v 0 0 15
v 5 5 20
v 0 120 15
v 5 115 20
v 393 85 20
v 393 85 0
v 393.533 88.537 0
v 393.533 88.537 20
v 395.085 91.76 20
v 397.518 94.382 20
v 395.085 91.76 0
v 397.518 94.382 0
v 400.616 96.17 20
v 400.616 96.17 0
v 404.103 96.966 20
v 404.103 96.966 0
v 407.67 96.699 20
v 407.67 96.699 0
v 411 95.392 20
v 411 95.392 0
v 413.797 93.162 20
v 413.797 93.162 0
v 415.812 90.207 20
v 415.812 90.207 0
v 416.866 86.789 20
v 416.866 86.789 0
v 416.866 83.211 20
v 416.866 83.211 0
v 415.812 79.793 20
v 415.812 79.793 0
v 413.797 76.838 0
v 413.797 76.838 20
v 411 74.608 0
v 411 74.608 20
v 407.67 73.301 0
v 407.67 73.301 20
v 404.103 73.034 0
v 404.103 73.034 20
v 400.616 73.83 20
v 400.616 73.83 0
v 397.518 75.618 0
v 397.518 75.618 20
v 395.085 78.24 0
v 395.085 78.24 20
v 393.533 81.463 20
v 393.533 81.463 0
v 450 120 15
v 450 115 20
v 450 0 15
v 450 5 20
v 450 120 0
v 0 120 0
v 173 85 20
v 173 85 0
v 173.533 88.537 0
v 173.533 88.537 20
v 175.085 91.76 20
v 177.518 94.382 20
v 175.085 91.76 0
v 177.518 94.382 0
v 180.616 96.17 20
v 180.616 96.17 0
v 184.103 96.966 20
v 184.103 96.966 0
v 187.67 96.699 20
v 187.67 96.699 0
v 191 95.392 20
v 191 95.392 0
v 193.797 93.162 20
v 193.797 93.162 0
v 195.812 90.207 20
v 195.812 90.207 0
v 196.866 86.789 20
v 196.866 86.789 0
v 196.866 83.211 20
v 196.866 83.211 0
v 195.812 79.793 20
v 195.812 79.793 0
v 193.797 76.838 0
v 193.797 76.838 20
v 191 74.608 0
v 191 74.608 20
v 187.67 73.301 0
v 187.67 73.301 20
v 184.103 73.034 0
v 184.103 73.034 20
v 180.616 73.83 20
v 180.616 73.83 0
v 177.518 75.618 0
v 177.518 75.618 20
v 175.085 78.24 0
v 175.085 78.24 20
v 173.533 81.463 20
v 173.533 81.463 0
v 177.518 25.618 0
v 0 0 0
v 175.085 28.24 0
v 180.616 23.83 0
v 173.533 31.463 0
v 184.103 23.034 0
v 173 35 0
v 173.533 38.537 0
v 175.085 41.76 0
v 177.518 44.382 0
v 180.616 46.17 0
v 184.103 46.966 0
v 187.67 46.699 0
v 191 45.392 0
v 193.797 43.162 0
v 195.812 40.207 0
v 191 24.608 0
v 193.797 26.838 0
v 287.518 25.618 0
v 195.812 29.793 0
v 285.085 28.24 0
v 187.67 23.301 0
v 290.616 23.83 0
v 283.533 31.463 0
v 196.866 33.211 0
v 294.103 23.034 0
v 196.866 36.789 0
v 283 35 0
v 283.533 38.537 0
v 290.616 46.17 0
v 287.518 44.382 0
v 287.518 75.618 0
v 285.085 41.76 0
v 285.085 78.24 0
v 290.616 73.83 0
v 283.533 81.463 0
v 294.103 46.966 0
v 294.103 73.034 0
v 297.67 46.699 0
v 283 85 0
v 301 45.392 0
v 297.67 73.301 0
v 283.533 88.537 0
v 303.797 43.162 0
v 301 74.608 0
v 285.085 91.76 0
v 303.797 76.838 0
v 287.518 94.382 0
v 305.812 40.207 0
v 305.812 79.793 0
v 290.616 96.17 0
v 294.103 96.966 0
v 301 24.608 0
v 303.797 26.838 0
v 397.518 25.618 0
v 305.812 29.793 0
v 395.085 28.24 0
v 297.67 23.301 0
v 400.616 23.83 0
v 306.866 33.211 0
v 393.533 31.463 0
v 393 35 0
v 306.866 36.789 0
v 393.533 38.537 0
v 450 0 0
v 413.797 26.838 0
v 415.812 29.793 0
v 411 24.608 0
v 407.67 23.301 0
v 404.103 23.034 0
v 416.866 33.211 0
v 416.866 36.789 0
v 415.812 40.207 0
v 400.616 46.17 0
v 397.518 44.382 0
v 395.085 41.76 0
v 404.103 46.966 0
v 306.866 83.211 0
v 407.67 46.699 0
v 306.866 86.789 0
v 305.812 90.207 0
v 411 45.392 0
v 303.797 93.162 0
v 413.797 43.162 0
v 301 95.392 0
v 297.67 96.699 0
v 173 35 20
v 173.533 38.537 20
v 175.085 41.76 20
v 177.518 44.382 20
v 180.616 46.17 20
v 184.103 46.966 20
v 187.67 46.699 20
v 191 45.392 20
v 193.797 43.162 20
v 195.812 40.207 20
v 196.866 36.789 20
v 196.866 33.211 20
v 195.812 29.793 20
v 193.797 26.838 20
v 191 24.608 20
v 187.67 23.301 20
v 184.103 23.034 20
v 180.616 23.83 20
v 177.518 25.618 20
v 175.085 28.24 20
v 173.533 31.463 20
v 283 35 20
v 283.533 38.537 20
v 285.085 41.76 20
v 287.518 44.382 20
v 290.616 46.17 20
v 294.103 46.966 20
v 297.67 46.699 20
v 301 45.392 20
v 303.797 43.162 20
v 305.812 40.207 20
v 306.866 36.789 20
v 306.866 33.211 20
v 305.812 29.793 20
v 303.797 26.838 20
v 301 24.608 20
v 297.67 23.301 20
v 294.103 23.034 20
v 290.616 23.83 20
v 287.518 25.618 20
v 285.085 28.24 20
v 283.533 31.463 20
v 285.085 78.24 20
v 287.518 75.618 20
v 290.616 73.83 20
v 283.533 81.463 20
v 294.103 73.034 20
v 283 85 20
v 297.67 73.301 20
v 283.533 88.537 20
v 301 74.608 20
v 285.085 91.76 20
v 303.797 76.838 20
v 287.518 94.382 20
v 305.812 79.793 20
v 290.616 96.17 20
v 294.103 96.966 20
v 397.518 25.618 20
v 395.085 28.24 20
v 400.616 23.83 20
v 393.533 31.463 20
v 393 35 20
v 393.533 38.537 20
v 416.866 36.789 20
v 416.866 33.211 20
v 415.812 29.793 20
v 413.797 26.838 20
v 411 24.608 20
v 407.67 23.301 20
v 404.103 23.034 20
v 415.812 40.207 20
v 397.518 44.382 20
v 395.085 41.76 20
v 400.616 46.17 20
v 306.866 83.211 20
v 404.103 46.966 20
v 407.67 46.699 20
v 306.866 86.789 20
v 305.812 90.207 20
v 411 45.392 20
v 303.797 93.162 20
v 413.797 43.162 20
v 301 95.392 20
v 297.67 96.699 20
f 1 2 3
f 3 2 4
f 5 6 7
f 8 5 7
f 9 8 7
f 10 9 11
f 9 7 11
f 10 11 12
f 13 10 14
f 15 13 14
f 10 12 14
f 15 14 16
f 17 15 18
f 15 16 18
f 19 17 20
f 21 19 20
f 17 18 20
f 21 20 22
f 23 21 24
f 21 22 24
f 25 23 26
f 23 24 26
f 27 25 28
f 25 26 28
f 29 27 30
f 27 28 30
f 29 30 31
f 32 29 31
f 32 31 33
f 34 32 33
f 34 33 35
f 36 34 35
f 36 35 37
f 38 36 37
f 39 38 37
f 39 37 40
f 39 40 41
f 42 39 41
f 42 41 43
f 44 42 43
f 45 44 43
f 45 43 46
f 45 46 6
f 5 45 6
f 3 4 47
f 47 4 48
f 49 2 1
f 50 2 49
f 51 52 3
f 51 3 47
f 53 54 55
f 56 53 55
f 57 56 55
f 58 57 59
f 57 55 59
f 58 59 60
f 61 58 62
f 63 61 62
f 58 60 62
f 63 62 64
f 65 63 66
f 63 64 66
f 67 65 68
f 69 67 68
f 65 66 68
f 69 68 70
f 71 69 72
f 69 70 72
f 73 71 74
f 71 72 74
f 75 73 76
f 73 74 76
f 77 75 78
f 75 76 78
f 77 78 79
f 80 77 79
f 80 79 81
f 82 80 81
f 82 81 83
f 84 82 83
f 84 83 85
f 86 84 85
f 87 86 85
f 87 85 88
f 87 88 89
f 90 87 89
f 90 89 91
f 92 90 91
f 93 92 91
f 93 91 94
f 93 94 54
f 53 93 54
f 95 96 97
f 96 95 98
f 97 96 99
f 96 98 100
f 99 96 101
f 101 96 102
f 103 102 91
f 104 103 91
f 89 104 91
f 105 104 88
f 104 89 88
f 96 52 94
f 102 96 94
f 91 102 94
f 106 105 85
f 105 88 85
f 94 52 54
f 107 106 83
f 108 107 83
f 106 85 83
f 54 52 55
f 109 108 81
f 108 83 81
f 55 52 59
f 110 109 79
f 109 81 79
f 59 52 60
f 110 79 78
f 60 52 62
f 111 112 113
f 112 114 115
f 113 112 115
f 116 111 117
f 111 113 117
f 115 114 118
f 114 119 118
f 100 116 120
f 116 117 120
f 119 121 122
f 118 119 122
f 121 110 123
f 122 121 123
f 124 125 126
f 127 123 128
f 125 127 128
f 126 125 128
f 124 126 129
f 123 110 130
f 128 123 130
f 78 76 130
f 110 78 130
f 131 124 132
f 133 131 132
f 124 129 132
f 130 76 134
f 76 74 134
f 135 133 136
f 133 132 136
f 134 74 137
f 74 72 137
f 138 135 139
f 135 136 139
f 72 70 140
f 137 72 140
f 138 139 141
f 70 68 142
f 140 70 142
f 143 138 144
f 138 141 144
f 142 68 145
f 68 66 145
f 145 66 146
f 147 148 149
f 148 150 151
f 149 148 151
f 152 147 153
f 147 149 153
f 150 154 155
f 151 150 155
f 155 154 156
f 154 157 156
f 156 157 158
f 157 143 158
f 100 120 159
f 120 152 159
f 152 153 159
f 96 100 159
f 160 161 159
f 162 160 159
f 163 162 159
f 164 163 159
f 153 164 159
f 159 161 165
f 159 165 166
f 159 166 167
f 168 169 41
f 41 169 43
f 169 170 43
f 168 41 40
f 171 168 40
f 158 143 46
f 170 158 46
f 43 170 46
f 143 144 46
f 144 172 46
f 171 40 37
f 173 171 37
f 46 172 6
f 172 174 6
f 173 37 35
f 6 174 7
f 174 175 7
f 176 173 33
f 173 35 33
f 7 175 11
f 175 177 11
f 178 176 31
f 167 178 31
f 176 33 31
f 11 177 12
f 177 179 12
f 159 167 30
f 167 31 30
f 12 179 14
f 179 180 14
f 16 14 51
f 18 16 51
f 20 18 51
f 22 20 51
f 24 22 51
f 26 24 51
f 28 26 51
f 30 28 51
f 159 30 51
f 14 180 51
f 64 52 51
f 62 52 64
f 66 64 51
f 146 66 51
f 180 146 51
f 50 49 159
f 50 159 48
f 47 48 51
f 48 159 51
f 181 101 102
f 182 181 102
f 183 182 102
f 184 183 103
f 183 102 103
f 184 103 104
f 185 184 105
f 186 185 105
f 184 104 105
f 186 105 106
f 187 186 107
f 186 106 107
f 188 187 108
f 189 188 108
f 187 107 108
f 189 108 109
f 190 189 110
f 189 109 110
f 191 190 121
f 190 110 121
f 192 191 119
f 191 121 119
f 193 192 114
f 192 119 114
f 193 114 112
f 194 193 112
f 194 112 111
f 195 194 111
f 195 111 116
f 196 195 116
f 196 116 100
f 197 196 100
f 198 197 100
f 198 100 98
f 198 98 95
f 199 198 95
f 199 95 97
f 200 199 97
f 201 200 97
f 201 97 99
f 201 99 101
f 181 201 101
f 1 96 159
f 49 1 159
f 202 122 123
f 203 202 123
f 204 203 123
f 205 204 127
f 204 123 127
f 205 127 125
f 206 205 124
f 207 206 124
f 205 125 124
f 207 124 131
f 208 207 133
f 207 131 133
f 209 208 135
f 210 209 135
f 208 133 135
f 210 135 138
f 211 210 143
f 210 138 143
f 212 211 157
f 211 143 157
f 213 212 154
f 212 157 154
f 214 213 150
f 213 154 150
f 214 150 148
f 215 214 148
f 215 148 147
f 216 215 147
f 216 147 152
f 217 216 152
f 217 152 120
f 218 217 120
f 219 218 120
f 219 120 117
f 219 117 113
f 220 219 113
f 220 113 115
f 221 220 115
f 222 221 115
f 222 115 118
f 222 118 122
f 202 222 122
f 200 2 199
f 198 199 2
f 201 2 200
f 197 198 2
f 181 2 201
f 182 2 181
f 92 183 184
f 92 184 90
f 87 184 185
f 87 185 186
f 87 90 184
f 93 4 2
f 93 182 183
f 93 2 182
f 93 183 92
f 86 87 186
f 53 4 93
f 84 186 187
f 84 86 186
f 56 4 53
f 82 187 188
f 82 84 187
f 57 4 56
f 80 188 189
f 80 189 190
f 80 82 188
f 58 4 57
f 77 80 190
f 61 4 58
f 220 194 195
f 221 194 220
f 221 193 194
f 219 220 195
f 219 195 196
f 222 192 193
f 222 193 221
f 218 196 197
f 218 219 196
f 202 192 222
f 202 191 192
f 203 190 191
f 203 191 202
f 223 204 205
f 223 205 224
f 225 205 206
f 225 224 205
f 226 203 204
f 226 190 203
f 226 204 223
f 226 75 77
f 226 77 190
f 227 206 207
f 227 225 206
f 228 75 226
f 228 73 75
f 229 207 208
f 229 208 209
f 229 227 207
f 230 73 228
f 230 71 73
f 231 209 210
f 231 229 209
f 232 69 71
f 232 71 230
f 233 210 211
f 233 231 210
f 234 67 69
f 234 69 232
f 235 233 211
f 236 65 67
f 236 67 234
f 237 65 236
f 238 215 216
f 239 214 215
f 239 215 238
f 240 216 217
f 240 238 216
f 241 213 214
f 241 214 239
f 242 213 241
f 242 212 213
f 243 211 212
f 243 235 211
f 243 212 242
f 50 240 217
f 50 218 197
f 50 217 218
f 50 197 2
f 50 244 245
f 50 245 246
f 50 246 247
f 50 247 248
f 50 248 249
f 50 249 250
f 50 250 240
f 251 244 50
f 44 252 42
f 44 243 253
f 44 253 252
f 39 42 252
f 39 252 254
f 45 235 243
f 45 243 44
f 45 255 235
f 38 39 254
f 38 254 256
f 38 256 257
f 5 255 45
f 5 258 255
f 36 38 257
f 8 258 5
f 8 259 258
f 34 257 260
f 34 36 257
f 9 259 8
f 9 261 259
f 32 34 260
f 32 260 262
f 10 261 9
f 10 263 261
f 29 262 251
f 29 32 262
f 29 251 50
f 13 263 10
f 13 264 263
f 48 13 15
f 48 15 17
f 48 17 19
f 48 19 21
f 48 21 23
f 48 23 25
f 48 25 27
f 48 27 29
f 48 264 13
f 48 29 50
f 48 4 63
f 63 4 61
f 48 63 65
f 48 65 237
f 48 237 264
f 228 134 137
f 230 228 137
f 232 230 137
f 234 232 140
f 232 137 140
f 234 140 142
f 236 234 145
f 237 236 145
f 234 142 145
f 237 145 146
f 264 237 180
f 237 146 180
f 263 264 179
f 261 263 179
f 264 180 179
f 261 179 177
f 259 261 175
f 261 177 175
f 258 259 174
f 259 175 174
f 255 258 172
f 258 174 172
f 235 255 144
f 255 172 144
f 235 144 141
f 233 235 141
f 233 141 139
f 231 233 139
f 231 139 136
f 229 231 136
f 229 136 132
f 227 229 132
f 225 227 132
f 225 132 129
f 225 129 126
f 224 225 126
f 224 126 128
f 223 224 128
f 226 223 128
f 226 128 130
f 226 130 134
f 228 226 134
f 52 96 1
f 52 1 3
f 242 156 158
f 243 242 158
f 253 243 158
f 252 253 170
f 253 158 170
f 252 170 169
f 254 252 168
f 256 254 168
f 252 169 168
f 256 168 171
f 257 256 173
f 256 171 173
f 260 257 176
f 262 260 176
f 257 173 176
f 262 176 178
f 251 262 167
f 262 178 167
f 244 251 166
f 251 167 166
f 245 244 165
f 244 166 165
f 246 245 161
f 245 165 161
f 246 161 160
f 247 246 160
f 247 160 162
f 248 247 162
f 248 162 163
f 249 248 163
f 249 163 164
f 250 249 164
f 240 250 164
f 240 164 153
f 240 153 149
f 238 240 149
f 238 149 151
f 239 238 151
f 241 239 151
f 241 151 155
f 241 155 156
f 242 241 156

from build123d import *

# Parameters (mm, degrees)
F0_W     = 450
F0_H     = 120
F1_DEPTH = 20
F3_D     = 24
F4_SIZE  = 5


with BuildPart() as f1:
    # F0 (on Top) → F1 (new body)
    with BuildSketch(Plane.XY):
        with Locations((225, 60)):
            Rectangle(F0_W, F0_H)
    extrude(amount=F1_DEPTH)

    # F3 (through all)
    with Locations(Plane.XY.offset(20)):
        with Locations((185, 85), (185, 35), (295, 85), (295, 35), (405, 85), (405, 35)):
            Hole(F3_D / 2)

    # F4
    f4_edges = [f1.edges().sort_by_distance(p)[0] for p in [
        (225, 120, 20),
        (225, 0, 20),
        (0, 60, 20),
    ]]
    chamfer(f4_edges, length=F4_SIZE)


solid = f1.part
